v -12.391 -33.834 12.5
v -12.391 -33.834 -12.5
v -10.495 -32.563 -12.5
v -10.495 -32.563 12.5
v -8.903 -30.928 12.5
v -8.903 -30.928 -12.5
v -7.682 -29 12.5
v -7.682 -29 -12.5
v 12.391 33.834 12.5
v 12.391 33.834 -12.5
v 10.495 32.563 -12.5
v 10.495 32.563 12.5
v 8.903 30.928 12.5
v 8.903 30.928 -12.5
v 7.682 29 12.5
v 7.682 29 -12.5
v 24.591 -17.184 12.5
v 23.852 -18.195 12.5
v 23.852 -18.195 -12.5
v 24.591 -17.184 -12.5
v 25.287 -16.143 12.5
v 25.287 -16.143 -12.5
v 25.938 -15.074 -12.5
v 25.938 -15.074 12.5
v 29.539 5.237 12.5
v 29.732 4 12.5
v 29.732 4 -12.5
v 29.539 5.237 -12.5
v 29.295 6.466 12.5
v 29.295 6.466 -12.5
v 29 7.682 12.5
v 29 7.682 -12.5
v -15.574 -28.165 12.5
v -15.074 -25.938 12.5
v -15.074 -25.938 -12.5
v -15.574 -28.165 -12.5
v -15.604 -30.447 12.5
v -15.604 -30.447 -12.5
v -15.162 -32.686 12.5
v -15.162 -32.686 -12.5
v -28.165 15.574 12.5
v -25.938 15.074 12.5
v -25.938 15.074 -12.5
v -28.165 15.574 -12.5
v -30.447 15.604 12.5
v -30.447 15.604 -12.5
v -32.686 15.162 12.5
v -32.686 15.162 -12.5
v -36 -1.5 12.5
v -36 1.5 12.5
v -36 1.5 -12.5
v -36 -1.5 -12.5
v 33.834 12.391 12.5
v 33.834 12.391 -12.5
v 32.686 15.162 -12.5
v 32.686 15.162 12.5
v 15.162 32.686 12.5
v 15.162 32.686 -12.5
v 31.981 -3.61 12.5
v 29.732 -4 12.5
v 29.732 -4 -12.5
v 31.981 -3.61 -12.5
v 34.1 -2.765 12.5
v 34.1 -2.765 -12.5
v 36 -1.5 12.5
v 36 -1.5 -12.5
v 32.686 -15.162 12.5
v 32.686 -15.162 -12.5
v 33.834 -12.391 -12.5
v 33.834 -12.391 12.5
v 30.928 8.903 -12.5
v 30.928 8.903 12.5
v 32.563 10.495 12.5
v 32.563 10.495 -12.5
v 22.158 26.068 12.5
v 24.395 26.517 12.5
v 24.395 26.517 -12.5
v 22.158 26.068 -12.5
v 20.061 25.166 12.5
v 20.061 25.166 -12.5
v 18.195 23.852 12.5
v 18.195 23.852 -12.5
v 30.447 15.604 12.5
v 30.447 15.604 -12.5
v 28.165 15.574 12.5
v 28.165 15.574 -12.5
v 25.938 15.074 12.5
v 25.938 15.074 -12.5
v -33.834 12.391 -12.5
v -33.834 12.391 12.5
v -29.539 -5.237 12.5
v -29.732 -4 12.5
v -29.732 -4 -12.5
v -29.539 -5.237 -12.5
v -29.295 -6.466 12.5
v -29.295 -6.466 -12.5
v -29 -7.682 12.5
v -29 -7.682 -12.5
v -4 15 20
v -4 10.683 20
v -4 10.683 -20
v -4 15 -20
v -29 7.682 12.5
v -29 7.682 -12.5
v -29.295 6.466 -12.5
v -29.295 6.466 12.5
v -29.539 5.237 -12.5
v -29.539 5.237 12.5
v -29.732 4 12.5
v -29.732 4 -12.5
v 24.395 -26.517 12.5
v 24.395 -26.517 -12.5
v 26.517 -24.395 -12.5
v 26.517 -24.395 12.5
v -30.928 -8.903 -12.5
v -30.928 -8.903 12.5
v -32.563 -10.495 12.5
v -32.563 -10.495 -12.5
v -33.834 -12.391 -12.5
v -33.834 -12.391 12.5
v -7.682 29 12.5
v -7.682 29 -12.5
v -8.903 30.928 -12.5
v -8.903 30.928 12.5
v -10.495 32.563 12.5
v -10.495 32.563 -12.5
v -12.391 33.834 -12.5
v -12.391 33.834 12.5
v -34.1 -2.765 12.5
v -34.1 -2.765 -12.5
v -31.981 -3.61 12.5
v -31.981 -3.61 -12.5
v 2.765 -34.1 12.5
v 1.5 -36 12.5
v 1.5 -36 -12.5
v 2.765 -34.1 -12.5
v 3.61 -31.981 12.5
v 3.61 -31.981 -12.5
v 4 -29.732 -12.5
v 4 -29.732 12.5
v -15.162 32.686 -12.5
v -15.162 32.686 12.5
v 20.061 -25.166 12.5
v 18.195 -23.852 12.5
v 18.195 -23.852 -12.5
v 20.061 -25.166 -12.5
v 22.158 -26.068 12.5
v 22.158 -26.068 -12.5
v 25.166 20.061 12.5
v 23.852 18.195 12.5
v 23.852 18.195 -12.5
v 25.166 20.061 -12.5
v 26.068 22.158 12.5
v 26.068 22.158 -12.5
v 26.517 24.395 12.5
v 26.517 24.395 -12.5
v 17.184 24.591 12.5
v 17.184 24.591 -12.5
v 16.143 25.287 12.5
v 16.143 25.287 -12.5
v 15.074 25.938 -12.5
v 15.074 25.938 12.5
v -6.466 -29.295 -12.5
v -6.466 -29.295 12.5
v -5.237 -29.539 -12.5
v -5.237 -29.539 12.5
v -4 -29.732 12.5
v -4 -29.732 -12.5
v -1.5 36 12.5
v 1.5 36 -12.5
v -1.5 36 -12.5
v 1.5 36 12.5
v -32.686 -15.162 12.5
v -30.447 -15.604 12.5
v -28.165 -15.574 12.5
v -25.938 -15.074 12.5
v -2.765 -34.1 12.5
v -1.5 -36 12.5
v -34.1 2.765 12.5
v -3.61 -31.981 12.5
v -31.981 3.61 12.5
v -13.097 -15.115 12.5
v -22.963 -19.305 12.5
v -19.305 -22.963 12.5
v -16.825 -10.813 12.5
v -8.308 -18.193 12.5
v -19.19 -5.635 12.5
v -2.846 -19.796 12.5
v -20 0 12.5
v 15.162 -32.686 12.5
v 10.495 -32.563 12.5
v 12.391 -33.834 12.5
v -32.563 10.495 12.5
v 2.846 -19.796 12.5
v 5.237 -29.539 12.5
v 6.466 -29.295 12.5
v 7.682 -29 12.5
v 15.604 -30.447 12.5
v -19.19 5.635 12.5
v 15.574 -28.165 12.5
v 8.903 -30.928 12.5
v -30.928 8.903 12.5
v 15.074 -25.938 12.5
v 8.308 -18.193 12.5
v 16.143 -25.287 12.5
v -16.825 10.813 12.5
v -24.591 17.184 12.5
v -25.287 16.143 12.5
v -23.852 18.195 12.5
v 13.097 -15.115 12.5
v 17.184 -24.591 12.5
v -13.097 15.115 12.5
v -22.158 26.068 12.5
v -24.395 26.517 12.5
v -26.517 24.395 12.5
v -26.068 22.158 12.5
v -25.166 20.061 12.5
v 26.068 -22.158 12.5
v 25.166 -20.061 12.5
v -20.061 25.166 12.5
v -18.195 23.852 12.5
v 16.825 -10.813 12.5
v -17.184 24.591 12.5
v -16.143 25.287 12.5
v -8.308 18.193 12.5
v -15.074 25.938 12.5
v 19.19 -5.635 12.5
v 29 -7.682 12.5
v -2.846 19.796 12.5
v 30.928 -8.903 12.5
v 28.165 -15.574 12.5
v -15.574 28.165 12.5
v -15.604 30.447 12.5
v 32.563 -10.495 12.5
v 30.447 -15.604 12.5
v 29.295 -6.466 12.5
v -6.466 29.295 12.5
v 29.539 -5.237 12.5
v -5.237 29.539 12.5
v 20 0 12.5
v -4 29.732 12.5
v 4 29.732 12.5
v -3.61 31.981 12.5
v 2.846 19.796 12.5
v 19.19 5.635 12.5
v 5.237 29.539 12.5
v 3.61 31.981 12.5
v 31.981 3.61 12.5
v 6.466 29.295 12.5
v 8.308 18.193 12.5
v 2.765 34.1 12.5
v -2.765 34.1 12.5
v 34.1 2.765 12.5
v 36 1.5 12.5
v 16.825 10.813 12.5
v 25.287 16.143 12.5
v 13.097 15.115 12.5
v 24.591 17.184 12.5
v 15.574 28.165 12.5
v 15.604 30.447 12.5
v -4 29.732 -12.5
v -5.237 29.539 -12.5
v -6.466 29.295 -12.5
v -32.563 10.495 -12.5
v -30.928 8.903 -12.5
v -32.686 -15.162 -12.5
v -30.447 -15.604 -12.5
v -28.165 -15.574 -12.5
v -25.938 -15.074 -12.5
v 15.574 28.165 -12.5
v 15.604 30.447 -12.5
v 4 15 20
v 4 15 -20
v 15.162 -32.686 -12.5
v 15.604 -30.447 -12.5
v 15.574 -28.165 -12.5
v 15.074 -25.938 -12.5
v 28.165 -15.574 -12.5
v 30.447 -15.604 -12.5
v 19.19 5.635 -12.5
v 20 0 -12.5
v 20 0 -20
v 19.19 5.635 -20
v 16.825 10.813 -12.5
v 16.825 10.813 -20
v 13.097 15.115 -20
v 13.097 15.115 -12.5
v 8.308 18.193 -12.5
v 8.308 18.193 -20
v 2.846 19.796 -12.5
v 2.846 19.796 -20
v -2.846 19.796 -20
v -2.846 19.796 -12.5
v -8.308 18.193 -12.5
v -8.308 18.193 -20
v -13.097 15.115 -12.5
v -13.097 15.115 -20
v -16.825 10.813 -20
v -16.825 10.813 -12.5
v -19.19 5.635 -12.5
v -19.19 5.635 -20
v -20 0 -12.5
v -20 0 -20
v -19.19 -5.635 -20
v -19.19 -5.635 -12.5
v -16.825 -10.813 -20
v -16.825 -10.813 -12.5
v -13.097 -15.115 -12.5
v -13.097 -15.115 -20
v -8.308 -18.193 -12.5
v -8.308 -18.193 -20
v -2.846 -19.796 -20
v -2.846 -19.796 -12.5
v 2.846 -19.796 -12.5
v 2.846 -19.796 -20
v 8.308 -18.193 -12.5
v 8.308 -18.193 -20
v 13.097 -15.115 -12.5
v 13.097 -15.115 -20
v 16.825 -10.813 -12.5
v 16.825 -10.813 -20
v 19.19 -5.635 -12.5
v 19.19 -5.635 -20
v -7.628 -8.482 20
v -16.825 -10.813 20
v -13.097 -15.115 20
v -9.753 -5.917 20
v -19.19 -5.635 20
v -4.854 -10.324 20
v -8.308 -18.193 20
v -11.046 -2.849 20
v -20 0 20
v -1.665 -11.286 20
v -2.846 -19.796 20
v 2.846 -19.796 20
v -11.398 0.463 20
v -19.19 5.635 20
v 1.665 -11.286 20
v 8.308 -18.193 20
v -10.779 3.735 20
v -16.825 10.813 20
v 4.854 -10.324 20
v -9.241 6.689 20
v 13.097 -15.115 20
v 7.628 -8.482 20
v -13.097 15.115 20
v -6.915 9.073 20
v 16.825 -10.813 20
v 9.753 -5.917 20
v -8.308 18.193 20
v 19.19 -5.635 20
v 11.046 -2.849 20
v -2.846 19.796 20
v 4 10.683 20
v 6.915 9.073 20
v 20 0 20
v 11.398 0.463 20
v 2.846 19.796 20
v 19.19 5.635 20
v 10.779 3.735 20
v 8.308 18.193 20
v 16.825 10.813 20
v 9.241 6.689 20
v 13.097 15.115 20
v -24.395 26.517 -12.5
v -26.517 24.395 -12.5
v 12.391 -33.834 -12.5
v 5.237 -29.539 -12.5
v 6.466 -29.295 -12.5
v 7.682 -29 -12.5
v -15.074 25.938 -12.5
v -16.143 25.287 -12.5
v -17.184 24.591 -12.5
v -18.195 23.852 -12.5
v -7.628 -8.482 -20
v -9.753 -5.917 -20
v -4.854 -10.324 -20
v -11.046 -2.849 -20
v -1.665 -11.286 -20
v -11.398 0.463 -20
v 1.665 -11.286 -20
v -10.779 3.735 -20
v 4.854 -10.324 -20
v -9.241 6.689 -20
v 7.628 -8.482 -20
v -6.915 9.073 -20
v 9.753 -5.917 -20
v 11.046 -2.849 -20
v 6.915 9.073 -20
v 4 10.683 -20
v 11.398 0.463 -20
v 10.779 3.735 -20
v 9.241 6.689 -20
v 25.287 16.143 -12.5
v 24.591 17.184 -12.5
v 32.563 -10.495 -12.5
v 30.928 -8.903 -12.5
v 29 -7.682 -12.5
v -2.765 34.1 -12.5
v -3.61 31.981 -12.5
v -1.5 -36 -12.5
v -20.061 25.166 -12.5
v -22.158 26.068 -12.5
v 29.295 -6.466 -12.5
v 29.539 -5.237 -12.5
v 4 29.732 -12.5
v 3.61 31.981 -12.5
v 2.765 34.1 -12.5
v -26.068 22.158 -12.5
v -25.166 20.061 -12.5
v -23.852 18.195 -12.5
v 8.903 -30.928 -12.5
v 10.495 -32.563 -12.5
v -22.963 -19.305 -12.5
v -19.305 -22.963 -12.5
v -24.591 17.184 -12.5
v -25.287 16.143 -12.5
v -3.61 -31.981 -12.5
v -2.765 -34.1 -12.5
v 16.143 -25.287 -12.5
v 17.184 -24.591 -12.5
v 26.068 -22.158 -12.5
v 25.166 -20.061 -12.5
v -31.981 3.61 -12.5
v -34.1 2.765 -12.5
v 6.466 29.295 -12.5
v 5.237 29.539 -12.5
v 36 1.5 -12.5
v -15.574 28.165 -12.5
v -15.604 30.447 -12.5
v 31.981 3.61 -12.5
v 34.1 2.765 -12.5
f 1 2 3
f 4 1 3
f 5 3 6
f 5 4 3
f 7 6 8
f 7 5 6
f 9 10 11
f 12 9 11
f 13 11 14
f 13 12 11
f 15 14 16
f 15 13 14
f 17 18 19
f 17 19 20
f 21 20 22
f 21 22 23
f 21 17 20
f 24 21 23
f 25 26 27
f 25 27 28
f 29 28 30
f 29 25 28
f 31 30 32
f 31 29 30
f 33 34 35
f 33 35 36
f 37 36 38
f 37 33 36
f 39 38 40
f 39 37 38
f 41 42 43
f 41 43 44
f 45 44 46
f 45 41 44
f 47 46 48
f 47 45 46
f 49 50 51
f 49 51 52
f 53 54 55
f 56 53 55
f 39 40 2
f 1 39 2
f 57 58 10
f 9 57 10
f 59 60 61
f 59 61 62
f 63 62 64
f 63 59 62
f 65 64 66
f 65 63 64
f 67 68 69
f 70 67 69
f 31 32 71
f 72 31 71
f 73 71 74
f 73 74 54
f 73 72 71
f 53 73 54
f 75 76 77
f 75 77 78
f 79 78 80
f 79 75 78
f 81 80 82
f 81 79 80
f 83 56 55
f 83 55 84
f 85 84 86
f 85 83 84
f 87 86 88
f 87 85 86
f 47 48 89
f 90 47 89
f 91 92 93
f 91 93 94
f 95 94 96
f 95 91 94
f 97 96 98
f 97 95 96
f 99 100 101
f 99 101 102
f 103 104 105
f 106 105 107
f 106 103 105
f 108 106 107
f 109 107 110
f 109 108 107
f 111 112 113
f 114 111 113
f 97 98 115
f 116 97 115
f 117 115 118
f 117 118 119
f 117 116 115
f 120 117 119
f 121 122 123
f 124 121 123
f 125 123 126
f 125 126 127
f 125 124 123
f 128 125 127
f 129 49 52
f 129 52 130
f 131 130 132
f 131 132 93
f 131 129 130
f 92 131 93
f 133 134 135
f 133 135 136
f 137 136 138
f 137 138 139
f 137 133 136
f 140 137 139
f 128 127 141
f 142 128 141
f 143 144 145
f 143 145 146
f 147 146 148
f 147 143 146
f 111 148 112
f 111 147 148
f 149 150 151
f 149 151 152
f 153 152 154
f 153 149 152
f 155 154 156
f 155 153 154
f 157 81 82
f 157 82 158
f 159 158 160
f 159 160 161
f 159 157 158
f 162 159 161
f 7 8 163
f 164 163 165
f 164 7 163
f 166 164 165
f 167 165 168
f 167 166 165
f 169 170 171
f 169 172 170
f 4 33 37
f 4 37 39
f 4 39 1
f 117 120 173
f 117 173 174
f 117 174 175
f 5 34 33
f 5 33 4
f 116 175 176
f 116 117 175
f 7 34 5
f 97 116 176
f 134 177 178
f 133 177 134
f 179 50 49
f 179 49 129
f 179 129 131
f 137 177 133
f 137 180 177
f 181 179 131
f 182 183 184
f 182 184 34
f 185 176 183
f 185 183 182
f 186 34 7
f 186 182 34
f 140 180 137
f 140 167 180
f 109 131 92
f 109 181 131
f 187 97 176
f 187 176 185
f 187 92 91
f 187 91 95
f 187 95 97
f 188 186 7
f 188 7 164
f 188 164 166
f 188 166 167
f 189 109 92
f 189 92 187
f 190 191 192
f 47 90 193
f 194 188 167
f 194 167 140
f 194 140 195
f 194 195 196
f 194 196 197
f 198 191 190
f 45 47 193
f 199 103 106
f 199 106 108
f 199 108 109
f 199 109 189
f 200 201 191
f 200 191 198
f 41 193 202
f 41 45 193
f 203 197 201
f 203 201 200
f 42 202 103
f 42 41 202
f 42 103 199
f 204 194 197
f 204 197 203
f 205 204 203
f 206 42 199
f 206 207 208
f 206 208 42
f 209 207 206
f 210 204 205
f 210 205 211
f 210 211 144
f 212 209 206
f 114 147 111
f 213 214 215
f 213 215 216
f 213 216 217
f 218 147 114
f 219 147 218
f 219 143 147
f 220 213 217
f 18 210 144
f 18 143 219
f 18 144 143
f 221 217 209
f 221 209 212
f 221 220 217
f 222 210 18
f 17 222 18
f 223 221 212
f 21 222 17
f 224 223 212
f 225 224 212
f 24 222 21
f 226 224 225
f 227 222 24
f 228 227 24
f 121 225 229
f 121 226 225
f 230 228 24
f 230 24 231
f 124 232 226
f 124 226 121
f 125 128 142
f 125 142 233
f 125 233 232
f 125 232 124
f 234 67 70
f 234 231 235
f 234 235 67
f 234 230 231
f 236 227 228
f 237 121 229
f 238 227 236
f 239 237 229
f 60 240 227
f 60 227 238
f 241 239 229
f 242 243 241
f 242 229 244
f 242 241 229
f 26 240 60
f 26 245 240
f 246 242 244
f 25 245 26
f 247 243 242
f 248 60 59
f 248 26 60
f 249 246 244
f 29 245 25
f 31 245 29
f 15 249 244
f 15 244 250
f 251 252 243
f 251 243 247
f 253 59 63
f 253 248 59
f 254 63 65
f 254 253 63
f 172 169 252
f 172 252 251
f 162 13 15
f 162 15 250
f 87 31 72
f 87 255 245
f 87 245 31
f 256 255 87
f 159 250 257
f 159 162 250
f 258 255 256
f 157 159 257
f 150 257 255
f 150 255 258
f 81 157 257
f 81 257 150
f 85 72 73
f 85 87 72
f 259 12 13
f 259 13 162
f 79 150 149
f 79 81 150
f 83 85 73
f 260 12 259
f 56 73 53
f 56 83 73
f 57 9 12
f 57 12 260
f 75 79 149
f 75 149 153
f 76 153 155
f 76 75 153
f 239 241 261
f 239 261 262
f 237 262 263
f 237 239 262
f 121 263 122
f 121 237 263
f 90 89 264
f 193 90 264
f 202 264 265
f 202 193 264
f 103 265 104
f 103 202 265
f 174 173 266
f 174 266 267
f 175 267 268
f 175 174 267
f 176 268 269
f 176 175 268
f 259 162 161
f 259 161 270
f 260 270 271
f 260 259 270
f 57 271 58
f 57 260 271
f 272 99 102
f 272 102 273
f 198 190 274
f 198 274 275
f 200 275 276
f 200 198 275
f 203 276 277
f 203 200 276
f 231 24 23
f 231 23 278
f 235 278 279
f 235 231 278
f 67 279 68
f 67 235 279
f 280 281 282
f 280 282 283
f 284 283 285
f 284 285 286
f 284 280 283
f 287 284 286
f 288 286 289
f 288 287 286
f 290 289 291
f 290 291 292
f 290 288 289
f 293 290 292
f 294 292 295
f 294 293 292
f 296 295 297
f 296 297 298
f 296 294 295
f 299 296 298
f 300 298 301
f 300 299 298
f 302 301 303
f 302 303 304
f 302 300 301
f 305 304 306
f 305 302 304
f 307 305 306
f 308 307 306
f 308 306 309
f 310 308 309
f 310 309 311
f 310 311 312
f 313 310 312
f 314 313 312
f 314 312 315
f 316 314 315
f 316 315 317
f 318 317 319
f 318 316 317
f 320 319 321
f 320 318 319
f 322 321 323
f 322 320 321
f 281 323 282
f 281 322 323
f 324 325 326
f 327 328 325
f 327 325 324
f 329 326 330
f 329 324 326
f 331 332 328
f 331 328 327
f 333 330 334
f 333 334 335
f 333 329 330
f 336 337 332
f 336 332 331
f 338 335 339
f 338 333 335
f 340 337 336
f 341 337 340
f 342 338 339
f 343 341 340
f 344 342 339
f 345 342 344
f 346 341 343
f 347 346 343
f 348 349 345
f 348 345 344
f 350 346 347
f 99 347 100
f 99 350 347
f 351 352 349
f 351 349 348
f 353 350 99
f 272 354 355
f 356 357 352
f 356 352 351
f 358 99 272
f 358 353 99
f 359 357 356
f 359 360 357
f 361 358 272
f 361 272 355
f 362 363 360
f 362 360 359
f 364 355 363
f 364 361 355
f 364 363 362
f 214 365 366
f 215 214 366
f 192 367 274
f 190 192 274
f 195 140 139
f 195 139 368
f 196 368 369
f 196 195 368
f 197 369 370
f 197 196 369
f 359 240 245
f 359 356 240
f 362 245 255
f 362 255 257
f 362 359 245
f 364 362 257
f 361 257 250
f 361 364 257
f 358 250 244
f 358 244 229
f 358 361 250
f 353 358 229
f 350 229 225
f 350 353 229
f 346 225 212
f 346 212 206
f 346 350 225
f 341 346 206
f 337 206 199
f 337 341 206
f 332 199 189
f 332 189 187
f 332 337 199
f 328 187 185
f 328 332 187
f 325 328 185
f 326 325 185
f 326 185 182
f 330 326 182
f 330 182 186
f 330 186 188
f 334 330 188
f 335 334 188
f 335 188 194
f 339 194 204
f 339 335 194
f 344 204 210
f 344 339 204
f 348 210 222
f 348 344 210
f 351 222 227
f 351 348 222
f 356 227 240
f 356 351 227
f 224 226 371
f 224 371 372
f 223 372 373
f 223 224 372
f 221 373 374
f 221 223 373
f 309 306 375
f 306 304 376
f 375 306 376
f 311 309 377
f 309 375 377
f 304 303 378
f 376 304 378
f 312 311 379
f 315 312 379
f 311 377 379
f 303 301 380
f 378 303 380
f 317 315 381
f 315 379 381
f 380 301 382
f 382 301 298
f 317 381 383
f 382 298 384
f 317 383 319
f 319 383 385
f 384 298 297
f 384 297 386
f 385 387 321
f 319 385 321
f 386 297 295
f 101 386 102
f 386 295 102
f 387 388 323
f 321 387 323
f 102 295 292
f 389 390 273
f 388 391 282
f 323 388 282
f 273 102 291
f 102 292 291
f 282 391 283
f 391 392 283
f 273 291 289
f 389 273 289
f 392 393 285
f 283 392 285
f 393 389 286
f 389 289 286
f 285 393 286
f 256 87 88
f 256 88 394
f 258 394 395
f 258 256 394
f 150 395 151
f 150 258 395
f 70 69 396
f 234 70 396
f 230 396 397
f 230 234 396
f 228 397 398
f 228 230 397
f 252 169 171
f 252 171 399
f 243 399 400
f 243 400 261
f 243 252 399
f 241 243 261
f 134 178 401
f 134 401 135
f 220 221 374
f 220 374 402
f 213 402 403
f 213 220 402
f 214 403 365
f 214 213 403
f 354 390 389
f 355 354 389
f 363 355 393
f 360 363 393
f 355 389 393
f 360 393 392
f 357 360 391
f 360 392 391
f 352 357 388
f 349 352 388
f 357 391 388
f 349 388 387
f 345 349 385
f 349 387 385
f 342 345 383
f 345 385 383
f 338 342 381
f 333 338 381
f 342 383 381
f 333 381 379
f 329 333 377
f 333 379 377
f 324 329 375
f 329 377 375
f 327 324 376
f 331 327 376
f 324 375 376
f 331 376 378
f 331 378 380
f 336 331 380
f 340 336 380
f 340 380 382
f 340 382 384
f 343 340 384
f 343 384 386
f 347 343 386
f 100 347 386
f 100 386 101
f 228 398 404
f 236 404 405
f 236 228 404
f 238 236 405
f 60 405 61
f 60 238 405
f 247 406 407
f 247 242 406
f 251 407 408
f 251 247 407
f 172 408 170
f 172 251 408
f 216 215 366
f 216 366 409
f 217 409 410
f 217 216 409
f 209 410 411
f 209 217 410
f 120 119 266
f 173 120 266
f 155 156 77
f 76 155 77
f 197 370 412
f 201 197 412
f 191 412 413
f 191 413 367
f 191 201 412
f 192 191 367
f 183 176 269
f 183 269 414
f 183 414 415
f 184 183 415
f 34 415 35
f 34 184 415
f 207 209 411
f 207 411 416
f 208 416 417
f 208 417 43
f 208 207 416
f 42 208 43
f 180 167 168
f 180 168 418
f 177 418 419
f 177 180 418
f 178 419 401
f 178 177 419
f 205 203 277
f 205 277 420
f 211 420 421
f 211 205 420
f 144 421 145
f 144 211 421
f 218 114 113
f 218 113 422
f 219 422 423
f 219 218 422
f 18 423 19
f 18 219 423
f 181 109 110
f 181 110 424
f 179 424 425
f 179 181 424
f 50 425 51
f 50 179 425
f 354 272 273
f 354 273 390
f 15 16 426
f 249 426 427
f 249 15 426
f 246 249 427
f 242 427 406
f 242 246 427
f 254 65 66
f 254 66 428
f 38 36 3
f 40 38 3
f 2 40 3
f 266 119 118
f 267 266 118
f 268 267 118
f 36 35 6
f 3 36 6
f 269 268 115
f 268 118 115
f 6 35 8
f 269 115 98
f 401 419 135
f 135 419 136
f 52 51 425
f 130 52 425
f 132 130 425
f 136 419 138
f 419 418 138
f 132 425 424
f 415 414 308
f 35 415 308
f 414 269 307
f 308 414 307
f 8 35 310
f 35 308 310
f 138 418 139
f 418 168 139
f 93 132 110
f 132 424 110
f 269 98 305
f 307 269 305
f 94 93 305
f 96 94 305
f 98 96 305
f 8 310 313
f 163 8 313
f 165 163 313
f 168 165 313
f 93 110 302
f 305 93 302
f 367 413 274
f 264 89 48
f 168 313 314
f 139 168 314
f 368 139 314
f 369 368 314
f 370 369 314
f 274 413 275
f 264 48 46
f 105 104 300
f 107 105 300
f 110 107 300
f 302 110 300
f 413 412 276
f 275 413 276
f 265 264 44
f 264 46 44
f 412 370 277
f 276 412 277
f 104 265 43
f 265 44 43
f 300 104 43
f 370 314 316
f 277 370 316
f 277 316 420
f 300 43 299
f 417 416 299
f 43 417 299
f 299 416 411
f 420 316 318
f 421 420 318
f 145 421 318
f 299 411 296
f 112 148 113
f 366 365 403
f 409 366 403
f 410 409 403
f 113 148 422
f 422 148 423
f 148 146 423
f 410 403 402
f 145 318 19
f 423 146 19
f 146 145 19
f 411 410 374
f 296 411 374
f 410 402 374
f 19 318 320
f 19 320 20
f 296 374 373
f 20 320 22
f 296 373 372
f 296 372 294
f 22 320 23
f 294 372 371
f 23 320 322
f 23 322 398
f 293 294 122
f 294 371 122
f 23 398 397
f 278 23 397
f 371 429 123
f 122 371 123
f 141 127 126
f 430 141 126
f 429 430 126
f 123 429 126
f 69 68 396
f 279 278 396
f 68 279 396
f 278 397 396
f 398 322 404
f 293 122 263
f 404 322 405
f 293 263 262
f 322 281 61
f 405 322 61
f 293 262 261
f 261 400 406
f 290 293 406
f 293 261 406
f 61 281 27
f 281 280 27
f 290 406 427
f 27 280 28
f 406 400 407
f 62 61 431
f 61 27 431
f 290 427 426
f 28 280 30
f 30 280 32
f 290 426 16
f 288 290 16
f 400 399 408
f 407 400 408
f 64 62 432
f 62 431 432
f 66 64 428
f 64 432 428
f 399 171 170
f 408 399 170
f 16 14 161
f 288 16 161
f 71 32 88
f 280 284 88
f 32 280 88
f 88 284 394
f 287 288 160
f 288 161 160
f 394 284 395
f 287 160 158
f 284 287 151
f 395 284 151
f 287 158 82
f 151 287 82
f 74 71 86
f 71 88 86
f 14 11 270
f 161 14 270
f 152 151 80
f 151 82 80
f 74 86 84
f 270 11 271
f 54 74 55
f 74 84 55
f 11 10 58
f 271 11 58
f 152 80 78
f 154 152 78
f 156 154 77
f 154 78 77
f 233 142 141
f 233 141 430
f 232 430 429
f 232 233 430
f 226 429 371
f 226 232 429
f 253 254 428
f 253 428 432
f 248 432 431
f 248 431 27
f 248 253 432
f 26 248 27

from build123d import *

# Parameters (mm, degrees)
BOSS_EXTRUDE1_DEPTH     = 12.5
SKETCH3_R               = 20
BOSS_EXTRUDE2_DEPTH     = 20
CUT_EXTRUDE1_DEPTH      = 65.745656225
CUT_EXTRUDE1_DEPTH_BACK = 65.745656225


with BuildPart() as part:
    # Sketch2 → Boss-Extrude1 (new, symmetric)
    with BuildSketch(Plane.XY):
        with BuildLine():
            Line((1.5, 36), (-1.5, 36))
            ThreePointArc((-1.5, 36), (-3.242504384, 33.062509074), (-4, 29.732137495))
            ThreePointArc((-4, 29.732137495), (-5.85270966, 29.423558412), (-7.682478298, 28.999647019))
            ThreePointArc((-7.682478298, 28.999647019), (-9.656791021, 31.786628134), (-12.390784266, 33.833688319))
            Line((-12.390784266, 33.833688319), (-15.162422864, 32.685638022))
            ThreePointArc((-15.162422864, 32.685638022), (-15.64815789, 29.30492272), (-15.073514558, 25.93817956))
            ThreePointArc((-15.073514558, 25.93817956), (-16.667106991, 24.944088369), (-18.195368917, 23.852223166))
            ThreePointArc((-18.195368917, 23.852223166), (-21.085927531, 25.671521208), (-24.395183951, 26.516504294))
            Line((-24.395183951, 26.516504294), (-26.516504294, 24.395183951))
            ThreePointArc((-26.516504294, 24.395183951), (-25.671521208, 21.085927531), (-23.852223166, 18.195368917))
            ThreePointArc((-23.852223166, 18.195368917), (-24.944088369, 16.667106991), (-25.93817956, 15.073514558))
            ThreePointArc((-25.93817956, 15.073514558), (-29.30492272, 15.64815789), (-32.685638022, 15.162422864))
            Line((-32.685638022, 15.162422864), (-33.833688319, 12.390784266))
            ThreePointArc((-33.833688319, 12.390784266), (-31.786628134, 9.656791021), (-28.999647019, 7.682478298))
            ThreePointArc((-28.999647019, 7.682478298), (-29.423558412, 5.85270966), (-29.732137495, 4))
            ThreePointArc((-29.732137495, 4), (-33.062509074, 3.242504384), (-36, 1.5))
            Line((-36, 1.5), (-36, -1.5))
            ThreePointArc((-36, -1.5), (-33.062509074, -3.242504384), (-29.732137495, -4))
            ThreePointArc((-29.732137495, -4), (-29.423558412, -5.85270966), (-28.999647019, -7.682478298))
            ThreePointArc((-28.999647019, -7.682478298), (-31.786628134, -9.656791021), (-33.833688319, -12.390784266))
            Line((-33.833688319, -12.390784266), (-32.685638022, -15.162422864))
            ThreePointArc((-32.685638022, -15.162422864), (-29.30492272, -15.64815789), (-25.93817956, -15.073514558))
            ThreePointArc((-25.93817956, -15.073514558), (-21.213203436, -21.213203436), (-15.073514558, -25.93817956))
            ThreePointArc((-15.073514558, -25.93817956), (-15.64815789, -29.30492272), (-15.162422864, -32.685638022))
            Line((-15.162422864, -32.685638022), (-12.390784266, -33.833688319))
            ThreePointArc((-12.390784266, -33.833688319), (-9.656791021, -31.786628134), (-7.682478298, -28.999647019))
            ThreePointArc((-7.682478298, -28.999647019), (-5.85270966, -29.423558412), (-4, -29.732137495))
            ThreePointArc((-4, -29.732137495), (-3.242504384, -33.062509074), (-1.5, -36))
            Line((-1.5, -36), (1.5, -36))
            ThreePointArc((1.5, -36), (3.242504384, -33.062509074), (4, -29.732137495))
            ThreePointArc((4, -29.732137495), (5.85270966, -29.423558412), (7.682478298, -28.999647019))
            ThreePointArc((7.682478298, -28.999647019), (9.656791021, -31.786628134), (12.390784266, -33.833688319))
            Line((12.390784266, -33.833688319), (15.162422864, -32.685638022))
            ThreePointArc((15.162422864, -32.685638022), (15.64815789, -29.30492272), (15.073514558, -25.93817956))
            ThreePointArc((15.073514558, -25.93817956), (16.667106991, -24.944088369), (18.195368917, -23.852223166))
            ThreePointArc((18.195368917, -23.852223166), (21.085927531, -25.671521208), (24.395183951, -26.516504294))
            Line((24.395183951, -26.516504294), (26.516504294, -24.395183951))
            ThreePointArc((26.516504294, -24.395183951), (25.671521208, -21.085927531), (23.852223166, -18.195368917))
            ThreePointArc((23.852223166, -18.195368917), (24.944088369, -16.667106991), (25.93817956, -15.073514558))
            ThreePointArc((25.93817956, -15.073514558), (29.30492272, -15.64815789), (32.685638022, -15.162422864))
            Line((32.685638022, -15.162422864), (33.833688319, -12.390784266))
            ThreePointArc((33.833688319, -12.390784266), (31.786628134, -9.656791021), (28.999647019, -7.682478298))
            ThreePointArc((28.999647019, -7.682478298), (29.423558412, -5.85270966), (29.732137495, -4))
            ThreePointArc((29.732137495, -4), (33.062509074, -3.242504384), (36, -1.5))
            Line((36, -1.5), (36, 1.5))
            ThreePointArc((36, 1.5), (33.062509074, 3.242504384), (29.732137495, 4))
            ThreePointArc((29.732137495, 4), (29.423558412, 5.85270966), (28.999647019, 7.682478298))
            ThreePointArc((28.999647019, 7.682478298), (31.786628134, 9.656791021), (33.833688319, 12.390784266))
            Line((33.833688319, 12.390784266), (32.685638022, 15.162422864))
            ThreePointArc((32.685638022, 15.162422864), (29.30492272, 15.64815789), (25.93817956, 15.073514558))
            ThreePointArc((25.93817956, 15.073514558), (24.944088369, 16.667106991), (23.852223166, 18.195368917))
            ThreePointArc((23.852223166, 18.195368917), (25.671521208, 21.085927531), (26.516504294, 24.395183951))
            Line((26.516504294, 24.395183951), (24.395183951, 26.516504294))
            ThreePointArc((24.395183951, 26.516504294), (21.085927531, 25.671521208), (18.195368917, 23.852223166))
            ThreePointArc((18.195368917, 23.852223166), (16.667106991, 24.944088369), (15.073514558, 25.93817956))
            ThreePointArc((15.073514558, 25.93817956), (15.64815789, 29.30492272), (15.162422864, 32.685638022))
            Line((15.162422864, 32.685638022), (12.390784266, 33.833688319))
            ThreePointArc((12.390784266, 33.833688319), (9.656791021, 31.786628134), (7.682478298, 28.999647019))
            ThreePointArc((7.682478298, 28.999647019), (5.85270966, 29.423558412), (4, 29.732137495))
            ThreePointArc((4, 29.732137495), (3.242504384, 33.062509074), (1.5, 36))
        make_face()
    extrude(amount=BOSS_EXTRUDE1_DEPTH, both=True)

    # Sketch3 → Boss-Extrude2 (add, symmetric)
    with BuildSketch(Plane.XY):
        Circle(SKETCH3_R)
    extrude(amount=BOSS_EXTRUDE2_DEPTH, both=True)

    # Sketch4 → Cut-Extrude1 (cut, two sides: drawn at the far end of the back side and taken through both)
    with BuildSketch(Plane.XY.offset(20).offset(-CUT_EXTRUDE1_DEPTH_BACK)):
        with BuildLine():
            Line((4, 15), (4, 10.683441748))
            ThreePointArc((4, 10.683441748), (0, -11.407713513), (-4, 10.683441748))
            Line((-4, 10.683441748), (-4, 15))
            Line((-4, 15), (4, 15))
        make_face()
    extrude(amount=CUT_EXTRUDE1_DEPTH + CUT_EXTRUDE1_DEPTH_BACK, mode=Mode.SUBTRACT)


solid = part.part
